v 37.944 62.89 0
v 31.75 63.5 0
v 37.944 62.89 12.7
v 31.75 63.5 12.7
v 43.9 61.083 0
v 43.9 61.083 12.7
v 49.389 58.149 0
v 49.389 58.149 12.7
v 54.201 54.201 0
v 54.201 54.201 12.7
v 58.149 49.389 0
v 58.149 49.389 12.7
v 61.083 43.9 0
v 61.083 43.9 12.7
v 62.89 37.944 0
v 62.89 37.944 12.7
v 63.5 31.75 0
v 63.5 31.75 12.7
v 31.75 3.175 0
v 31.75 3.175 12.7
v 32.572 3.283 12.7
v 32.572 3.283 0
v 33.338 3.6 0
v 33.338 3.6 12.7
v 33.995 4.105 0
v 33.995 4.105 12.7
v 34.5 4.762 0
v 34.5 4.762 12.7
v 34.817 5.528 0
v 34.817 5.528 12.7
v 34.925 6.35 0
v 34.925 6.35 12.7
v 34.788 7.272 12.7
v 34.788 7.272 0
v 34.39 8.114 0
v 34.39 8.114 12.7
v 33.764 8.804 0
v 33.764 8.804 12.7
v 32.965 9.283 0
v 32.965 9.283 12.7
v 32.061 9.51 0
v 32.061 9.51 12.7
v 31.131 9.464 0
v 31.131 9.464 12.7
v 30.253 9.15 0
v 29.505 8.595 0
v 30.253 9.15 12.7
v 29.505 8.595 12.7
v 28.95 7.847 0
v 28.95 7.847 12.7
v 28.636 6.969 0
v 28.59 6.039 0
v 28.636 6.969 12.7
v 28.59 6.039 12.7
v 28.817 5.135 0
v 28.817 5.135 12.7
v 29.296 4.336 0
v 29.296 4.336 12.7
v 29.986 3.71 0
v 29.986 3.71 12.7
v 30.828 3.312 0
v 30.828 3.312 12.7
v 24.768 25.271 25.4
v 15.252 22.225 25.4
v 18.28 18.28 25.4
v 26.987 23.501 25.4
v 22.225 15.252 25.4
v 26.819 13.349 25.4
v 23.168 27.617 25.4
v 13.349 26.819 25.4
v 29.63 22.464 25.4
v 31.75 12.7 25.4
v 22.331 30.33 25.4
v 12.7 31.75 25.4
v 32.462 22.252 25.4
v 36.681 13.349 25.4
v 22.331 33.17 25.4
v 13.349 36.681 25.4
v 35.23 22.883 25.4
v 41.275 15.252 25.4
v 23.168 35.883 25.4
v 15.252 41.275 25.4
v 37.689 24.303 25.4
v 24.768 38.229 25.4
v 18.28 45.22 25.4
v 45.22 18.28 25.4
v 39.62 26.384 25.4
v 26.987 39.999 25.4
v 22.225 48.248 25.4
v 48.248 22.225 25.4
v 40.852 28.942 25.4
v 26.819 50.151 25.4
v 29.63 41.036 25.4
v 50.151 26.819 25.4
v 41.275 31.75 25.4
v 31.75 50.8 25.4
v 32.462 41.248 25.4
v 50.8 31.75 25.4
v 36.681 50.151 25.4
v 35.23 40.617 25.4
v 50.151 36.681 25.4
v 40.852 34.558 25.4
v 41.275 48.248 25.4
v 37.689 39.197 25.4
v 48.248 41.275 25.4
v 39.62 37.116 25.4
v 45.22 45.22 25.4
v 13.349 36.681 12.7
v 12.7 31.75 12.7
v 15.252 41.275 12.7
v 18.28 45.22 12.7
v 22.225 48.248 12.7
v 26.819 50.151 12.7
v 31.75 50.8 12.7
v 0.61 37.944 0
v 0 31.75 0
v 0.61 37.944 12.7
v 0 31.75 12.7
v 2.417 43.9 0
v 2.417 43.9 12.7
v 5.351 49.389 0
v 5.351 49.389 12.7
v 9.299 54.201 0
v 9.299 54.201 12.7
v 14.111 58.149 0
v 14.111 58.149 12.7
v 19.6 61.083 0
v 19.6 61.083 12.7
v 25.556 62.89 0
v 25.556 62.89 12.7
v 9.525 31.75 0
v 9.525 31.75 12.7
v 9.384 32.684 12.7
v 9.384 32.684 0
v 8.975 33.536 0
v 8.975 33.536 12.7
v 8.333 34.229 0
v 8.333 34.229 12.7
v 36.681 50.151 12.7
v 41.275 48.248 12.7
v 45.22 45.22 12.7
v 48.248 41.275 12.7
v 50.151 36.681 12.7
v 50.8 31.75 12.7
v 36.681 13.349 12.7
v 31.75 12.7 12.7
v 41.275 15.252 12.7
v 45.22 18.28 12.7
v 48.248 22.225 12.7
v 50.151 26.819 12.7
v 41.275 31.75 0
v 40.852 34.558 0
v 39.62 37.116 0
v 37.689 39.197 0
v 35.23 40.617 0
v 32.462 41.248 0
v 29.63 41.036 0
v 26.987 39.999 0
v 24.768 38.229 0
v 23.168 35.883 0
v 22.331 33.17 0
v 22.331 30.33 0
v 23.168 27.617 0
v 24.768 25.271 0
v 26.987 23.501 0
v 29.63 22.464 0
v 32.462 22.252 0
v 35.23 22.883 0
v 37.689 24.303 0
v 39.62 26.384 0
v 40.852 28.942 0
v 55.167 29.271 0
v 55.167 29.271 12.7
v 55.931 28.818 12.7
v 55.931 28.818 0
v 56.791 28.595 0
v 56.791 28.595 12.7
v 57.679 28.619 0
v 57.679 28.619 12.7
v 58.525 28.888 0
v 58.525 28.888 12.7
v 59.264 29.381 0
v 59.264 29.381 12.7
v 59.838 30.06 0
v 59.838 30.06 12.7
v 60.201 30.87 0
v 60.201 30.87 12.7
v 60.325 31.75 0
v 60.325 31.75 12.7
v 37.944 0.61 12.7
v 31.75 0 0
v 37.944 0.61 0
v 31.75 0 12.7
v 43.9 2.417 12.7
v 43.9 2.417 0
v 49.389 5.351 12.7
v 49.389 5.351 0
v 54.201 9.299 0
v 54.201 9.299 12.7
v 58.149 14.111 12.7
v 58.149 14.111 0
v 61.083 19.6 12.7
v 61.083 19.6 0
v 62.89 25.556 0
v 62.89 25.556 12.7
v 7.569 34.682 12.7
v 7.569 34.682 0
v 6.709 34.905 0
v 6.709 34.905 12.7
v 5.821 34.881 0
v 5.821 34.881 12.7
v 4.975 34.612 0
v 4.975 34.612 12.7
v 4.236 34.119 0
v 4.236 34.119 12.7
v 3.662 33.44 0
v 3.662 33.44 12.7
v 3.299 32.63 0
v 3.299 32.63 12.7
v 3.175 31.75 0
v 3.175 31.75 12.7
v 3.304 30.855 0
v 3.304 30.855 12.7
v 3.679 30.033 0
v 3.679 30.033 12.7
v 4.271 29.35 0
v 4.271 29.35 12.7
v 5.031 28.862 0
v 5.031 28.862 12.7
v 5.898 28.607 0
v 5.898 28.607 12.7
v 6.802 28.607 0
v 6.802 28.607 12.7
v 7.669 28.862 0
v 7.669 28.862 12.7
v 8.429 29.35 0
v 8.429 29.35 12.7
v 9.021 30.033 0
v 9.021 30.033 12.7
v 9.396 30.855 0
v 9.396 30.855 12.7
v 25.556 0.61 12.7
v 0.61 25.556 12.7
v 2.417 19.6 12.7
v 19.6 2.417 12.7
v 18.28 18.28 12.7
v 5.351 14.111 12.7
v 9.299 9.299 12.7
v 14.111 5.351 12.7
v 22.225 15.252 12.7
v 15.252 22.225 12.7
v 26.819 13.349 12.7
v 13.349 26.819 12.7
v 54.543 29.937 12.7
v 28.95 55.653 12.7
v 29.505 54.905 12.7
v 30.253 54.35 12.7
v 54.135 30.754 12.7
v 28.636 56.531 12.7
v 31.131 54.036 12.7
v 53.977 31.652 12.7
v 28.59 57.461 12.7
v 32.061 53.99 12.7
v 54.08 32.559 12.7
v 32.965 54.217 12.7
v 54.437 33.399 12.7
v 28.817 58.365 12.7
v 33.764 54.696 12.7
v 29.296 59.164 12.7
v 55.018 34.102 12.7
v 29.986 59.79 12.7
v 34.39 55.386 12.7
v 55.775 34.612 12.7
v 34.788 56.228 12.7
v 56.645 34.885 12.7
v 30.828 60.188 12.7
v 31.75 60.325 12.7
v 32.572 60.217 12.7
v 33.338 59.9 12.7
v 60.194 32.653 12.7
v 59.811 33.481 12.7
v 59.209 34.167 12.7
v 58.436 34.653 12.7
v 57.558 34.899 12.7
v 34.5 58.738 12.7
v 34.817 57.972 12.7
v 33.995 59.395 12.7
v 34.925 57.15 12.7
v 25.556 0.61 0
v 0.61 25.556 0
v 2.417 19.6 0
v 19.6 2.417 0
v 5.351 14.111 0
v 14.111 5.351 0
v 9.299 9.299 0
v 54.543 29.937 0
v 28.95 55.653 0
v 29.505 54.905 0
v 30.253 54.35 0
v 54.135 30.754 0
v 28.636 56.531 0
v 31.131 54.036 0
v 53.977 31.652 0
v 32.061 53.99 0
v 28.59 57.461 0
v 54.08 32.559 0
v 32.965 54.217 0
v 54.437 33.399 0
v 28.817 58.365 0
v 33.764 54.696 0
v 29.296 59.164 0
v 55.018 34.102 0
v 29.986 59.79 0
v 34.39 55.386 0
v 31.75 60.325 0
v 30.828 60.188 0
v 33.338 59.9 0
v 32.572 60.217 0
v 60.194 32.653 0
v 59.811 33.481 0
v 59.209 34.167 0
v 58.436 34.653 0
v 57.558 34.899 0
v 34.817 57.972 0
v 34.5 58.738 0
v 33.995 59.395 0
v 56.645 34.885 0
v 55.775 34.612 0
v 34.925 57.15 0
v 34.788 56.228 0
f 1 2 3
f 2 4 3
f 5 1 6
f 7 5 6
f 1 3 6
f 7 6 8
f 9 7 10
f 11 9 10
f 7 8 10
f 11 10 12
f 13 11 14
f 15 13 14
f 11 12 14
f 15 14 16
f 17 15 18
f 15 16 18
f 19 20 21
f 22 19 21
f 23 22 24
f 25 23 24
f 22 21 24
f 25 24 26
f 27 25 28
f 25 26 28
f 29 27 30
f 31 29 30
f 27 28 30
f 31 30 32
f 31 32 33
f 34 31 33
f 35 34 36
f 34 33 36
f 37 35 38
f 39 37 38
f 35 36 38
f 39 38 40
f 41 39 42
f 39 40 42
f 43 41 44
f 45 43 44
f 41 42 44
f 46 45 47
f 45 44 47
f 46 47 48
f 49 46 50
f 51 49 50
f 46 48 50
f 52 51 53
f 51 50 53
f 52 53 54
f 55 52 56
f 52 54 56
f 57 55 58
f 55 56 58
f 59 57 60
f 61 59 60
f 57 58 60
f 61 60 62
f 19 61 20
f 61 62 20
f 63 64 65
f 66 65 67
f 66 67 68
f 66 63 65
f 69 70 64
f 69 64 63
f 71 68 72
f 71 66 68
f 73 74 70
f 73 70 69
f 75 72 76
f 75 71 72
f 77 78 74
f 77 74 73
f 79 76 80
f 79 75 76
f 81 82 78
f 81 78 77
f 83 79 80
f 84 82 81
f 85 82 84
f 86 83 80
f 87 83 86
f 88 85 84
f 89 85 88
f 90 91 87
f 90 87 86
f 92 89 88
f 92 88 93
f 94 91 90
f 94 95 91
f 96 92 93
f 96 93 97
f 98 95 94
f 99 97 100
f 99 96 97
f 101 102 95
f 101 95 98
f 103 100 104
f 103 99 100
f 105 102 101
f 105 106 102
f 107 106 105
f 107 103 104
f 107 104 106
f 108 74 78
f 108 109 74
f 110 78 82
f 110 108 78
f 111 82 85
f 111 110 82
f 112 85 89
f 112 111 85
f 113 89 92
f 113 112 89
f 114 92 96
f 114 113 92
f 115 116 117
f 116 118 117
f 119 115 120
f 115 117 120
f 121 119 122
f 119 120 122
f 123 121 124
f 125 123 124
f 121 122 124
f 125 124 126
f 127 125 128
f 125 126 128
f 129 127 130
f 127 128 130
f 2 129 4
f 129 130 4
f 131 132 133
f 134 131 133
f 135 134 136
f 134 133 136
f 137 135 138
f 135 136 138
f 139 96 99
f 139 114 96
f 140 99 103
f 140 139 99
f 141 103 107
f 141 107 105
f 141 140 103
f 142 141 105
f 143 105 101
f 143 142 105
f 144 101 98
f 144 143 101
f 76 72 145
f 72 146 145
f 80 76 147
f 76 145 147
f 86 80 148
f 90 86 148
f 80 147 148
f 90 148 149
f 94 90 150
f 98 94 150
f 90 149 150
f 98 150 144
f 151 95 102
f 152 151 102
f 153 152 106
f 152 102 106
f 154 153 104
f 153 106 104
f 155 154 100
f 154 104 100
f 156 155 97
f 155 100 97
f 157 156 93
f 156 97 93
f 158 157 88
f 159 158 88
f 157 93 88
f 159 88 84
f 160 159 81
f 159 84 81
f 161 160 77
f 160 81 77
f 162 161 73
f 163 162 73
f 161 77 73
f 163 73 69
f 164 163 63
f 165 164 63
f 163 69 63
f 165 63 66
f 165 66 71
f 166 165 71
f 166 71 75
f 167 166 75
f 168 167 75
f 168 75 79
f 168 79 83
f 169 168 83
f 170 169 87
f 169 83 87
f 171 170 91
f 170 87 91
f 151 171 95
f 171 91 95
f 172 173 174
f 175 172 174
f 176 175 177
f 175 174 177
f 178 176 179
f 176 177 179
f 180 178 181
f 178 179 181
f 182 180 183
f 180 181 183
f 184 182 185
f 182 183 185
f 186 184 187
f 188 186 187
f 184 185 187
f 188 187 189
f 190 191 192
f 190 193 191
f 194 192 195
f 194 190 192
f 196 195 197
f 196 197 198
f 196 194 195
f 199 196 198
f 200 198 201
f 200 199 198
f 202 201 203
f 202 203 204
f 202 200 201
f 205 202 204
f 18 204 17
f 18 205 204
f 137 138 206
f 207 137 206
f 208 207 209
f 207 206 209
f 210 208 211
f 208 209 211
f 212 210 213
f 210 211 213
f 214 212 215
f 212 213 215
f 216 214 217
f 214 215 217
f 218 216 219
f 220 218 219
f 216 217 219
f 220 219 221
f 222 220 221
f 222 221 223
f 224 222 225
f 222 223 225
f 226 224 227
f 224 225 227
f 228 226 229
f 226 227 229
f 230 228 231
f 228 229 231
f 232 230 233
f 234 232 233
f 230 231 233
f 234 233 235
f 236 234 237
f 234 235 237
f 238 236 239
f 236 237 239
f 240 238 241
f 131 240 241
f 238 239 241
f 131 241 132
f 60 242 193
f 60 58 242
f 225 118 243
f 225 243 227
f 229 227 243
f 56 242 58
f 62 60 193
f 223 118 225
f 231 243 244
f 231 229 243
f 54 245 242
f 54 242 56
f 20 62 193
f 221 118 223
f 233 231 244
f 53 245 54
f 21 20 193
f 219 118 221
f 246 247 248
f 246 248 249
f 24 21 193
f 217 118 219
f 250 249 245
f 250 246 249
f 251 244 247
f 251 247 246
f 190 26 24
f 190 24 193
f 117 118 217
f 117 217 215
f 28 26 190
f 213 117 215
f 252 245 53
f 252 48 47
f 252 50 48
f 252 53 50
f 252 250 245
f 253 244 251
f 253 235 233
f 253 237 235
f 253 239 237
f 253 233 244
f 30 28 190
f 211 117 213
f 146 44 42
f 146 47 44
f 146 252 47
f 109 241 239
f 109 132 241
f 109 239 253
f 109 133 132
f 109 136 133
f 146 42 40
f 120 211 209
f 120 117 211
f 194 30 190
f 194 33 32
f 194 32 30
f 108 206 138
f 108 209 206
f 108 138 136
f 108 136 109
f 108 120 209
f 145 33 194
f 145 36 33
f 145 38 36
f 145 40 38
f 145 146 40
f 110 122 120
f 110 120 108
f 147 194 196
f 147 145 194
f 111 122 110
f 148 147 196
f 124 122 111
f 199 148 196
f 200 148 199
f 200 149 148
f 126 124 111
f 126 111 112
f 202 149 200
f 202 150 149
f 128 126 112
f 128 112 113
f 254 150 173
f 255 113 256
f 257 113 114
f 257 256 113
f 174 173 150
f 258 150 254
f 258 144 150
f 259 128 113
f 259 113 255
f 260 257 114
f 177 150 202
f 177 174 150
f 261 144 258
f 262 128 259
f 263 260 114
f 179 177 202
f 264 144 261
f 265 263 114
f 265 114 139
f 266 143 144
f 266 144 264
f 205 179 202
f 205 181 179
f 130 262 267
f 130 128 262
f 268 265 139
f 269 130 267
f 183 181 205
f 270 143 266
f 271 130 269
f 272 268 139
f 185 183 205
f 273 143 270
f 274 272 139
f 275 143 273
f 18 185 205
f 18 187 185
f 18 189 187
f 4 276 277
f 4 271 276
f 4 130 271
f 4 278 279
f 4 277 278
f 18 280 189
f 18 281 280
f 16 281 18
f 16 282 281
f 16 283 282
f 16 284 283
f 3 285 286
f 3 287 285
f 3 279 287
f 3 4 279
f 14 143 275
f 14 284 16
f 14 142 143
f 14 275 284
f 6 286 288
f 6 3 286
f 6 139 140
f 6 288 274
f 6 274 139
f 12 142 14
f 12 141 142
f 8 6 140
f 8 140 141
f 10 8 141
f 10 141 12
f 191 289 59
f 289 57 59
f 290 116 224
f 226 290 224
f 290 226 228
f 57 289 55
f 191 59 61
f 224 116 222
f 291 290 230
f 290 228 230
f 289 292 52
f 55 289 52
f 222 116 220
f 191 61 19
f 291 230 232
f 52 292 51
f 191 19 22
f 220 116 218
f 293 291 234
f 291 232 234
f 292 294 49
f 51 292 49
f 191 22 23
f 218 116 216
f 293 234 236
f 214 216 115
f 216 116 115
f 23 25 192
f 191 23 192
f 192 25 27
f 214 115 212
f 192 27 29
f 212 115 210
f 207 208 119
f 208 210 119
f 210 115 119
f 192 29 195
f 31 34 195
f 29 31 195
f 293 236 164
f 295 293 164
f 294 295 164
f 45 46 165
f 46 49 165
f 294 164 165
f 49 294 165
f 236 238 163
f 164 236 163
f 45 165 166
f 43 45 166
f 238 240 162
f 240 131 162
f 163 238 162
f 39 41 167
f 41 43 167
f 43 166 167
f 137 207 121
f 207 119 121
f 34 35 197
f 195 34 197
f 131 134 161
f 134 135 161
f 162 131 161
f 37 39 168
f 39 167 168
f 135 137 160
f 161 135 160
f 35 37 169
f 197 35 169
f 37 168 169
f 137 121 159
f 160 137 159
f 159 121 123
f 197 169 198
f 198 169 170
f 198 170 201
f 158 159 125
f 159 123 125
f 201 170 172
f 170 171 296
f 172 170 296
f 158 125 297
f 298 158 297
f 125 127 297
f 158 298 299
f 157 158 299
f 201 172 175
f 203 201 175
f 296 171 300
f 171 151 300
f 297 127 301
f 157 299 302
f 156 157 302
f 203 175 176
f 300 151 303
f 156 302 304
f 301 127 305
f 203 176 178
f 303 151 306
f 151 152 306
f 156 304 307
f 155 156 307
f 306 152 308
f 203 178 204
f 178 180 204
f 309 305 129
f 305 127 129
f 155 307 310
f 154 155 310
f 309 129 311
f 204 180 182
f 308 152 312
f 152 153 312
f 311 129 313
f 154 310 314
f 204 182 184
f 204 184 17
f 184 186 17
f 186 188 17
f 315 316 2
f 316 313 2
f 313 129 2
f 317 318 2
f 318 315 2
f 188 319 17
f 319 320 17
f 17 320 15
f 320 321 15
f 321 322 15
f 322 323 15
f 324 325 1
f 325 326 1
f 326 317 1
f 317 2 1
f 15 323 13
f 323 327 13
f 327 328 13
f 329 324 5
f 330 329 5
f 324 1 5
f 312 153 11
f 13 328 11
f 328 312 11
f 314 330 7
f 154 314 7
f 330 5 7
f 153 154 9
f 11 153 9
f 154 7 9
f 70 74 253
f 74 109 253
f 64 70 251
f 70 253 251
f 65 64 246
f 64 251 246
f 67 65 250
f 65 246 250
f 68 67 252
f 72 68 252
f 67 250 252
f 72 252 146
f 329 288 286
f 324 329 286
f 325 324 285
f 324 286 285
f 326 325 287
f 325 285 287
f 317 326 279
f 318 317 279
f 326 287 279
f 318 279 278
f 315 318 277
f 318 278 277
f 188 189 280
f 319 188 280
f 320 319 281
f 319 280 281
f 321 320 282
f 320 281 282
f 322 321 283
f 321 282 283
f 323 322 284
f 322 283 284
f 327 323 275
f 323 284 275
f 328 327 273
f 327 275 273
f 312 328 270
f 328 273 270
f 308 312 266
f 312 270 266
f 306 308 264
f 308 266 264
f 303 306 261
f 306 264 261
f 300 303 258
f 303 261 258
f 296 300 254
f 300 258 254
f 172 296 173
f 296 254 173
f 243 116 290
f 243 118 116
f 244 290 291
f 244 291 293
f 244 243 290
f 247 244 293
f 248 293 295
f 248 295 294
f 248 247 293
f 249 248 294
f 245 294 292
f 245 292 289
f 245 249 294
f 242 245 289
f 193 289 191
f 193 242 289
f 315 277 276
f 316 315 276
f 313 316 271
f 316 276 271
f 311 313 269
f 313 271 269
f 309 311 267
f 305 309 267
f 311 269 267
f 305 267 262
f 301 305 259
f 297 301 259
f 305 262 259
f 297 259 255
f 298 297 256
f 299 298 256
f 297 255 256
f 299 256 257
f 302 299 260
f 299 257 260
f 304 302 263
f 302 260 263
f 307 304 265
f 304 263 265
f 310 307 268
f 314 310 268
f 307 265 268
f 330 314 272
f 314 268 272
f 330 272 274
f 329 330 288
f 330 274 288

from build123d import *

# Parameters (mm, degrees)
F0_W     = 63.5
F0_H     = 63.5
F1_DEPTH = 25.4
F2_W     = 63.5
F2_H     = 63.5
F3_DEPTH = 12.7
F5_DEPTH = 25.4
F7_DEPTH = 25.4
F8_R     = 31.74999
F9_R     = 19.04999


# Not quite as in the source:
# - a fillet or chamfer is up to 0.001 mm smaller than in the source, because OpenCascade refuses the exact size


with BuildPart() as f1:
    # F0 (on Top) → F1 (new body)
    with BuildSketch(Plane.XY):
        with Locations((31.75, 31.75)):
            Rectangle(F0_W, F0_H)
    extrude(amount=F1_DEPTH)

    # F2 (on face) → F3 (cut)
    with BuildSketch(Plane.XY.offset(25.4)):
        with Locations((31.75, 31.75)):
            Rectangle(F2_W, F2_H)
        Polygon((12.7, 50.8), (31.75, 50.8), (50.8, 50.8), (50.8, 31.75), (50.8, 12.7), (12.7, 12.7), align=None, mode=Mode.SUBTRACT)
    extrude(amount=-F3_DEPTH, mode=Mode.SUBTRACT)

    # F4 (on face) → F5 (cut)
    with BuildSketch(Plane.XY.offset(12.7)):
        with BuildLine():
            ThreePointArc((8.333406776, 34.22925847), (4.9746257807, 34.6116377753), (3.175, 31.75))
            Line((3.175, 31.75), (6.35, 31.75))
            Line((6.35, 31.75), (8.333406776, 34.22925847))
        make_face()
        with BuildLine():
            ThreePointArc((34.925, 57.15), (33.9950640303, 59.3950640303), (31.75, 60.325))
            ThreePointArc((31.75, 60.325), (29.5049359697, 54.9049359697), (34.925, 57.15))
        make_face()
        with BuildLine():
            Line((6.35, 31.75), (3.175, 31.75))
            ThreePointArc((3.175, 31.75), (6.35, 28.575), (9.525, 31.75))
            ThreePointArc((9.525, 31.75), (9.2116377753, 33.1253742193), (8.333406776, 34.22925847))
            Line((8.333406776, 34.22925847), (6.35, 31.75))
        make_face()
        with BuildLine():
            ThreePointArc((55.166593224, 29.27074153), (58.5253742193, 28.8883622247), (60.325, 31.75))
            Line((60.325, 31.75), (57.15, 31.75))
            Line((57.15, 31.75), (55.166593224, 29.27074153))
        make_face()
        with BuildLine():
            Line((57.15, 31.75), (60.325, 31.75))
            ThreePointArc((60.325, 31.75), (55.7746257807, 34.6116377753), (55.166593224, 29.27074153))
            Line((55.166593224, 29.27074153), (57.15, 31.75))
        make_face()
        with BuildLine():
            ThreePointArc((34.925, 6.35), (29.5049359697, 8.5950640303), (31.75, 3.175))
            ThreePointArc((31.75, 3.175), (33.9950640303, 4.1049359697), (34.925, 6.35))
        make_face()
    extrude(amount=-F5_DEPTH, mode=Mode.SUBTRACT)

    # F6 (on face) → F7 (cut)
    with BuildSketch(Plane.XY.offset(25.4)):
        with BuildLine():
            ThreePointArc((41.275, 31.75), (38.4851920908, 38.4851920908), (31.75, 41.275))
            Line((31.75, 41.275), (31.75, 22.225))
            ThreePointArc((31.75, 22.225), (38.4851920908, 25.0148079092), (41.275, 31.75))
        make_face()
        with BuildLine():
            Line((31.75, 22.225), (31.75, 41.275))
            ThreePointArc((31.75, 41.275), (22.225, 31.75), (31.75, 22.225))
        make_face()
    extrude(amount=-F7_DEPTH, mode=Mode.SUBTRACT)

    # F8 (radius 31.75 in the source; OpenCascade refuses exactly that, so slightly less here)
    f8_edges = [f1.edges().sort_by_distance(p)[0] for p in [
        (0, 0, 6.35),
        (63.5, 0, 6.35),
        (63.5, 63.5, 6.35),
        (0, 63.5, 6.35),
    ]]
    fillet(f8_edges, radius=F8_R)

    # F9 (radius 19.05 in the source; OpenCascade refuses exactly that, so slightly less here)
    f9_edges = [f1.edges().sort_by_distance(p)[0] for p in [
        (12.7, 12.7, 19.05),
        (50.8, 12.7, 19.05),
        (12.7, 50.8, 19.05),
        (50.8, 50.8, 19.05),
    ]]
    fillet(f9_edges, radius=F9_R)


solid = f1.part
